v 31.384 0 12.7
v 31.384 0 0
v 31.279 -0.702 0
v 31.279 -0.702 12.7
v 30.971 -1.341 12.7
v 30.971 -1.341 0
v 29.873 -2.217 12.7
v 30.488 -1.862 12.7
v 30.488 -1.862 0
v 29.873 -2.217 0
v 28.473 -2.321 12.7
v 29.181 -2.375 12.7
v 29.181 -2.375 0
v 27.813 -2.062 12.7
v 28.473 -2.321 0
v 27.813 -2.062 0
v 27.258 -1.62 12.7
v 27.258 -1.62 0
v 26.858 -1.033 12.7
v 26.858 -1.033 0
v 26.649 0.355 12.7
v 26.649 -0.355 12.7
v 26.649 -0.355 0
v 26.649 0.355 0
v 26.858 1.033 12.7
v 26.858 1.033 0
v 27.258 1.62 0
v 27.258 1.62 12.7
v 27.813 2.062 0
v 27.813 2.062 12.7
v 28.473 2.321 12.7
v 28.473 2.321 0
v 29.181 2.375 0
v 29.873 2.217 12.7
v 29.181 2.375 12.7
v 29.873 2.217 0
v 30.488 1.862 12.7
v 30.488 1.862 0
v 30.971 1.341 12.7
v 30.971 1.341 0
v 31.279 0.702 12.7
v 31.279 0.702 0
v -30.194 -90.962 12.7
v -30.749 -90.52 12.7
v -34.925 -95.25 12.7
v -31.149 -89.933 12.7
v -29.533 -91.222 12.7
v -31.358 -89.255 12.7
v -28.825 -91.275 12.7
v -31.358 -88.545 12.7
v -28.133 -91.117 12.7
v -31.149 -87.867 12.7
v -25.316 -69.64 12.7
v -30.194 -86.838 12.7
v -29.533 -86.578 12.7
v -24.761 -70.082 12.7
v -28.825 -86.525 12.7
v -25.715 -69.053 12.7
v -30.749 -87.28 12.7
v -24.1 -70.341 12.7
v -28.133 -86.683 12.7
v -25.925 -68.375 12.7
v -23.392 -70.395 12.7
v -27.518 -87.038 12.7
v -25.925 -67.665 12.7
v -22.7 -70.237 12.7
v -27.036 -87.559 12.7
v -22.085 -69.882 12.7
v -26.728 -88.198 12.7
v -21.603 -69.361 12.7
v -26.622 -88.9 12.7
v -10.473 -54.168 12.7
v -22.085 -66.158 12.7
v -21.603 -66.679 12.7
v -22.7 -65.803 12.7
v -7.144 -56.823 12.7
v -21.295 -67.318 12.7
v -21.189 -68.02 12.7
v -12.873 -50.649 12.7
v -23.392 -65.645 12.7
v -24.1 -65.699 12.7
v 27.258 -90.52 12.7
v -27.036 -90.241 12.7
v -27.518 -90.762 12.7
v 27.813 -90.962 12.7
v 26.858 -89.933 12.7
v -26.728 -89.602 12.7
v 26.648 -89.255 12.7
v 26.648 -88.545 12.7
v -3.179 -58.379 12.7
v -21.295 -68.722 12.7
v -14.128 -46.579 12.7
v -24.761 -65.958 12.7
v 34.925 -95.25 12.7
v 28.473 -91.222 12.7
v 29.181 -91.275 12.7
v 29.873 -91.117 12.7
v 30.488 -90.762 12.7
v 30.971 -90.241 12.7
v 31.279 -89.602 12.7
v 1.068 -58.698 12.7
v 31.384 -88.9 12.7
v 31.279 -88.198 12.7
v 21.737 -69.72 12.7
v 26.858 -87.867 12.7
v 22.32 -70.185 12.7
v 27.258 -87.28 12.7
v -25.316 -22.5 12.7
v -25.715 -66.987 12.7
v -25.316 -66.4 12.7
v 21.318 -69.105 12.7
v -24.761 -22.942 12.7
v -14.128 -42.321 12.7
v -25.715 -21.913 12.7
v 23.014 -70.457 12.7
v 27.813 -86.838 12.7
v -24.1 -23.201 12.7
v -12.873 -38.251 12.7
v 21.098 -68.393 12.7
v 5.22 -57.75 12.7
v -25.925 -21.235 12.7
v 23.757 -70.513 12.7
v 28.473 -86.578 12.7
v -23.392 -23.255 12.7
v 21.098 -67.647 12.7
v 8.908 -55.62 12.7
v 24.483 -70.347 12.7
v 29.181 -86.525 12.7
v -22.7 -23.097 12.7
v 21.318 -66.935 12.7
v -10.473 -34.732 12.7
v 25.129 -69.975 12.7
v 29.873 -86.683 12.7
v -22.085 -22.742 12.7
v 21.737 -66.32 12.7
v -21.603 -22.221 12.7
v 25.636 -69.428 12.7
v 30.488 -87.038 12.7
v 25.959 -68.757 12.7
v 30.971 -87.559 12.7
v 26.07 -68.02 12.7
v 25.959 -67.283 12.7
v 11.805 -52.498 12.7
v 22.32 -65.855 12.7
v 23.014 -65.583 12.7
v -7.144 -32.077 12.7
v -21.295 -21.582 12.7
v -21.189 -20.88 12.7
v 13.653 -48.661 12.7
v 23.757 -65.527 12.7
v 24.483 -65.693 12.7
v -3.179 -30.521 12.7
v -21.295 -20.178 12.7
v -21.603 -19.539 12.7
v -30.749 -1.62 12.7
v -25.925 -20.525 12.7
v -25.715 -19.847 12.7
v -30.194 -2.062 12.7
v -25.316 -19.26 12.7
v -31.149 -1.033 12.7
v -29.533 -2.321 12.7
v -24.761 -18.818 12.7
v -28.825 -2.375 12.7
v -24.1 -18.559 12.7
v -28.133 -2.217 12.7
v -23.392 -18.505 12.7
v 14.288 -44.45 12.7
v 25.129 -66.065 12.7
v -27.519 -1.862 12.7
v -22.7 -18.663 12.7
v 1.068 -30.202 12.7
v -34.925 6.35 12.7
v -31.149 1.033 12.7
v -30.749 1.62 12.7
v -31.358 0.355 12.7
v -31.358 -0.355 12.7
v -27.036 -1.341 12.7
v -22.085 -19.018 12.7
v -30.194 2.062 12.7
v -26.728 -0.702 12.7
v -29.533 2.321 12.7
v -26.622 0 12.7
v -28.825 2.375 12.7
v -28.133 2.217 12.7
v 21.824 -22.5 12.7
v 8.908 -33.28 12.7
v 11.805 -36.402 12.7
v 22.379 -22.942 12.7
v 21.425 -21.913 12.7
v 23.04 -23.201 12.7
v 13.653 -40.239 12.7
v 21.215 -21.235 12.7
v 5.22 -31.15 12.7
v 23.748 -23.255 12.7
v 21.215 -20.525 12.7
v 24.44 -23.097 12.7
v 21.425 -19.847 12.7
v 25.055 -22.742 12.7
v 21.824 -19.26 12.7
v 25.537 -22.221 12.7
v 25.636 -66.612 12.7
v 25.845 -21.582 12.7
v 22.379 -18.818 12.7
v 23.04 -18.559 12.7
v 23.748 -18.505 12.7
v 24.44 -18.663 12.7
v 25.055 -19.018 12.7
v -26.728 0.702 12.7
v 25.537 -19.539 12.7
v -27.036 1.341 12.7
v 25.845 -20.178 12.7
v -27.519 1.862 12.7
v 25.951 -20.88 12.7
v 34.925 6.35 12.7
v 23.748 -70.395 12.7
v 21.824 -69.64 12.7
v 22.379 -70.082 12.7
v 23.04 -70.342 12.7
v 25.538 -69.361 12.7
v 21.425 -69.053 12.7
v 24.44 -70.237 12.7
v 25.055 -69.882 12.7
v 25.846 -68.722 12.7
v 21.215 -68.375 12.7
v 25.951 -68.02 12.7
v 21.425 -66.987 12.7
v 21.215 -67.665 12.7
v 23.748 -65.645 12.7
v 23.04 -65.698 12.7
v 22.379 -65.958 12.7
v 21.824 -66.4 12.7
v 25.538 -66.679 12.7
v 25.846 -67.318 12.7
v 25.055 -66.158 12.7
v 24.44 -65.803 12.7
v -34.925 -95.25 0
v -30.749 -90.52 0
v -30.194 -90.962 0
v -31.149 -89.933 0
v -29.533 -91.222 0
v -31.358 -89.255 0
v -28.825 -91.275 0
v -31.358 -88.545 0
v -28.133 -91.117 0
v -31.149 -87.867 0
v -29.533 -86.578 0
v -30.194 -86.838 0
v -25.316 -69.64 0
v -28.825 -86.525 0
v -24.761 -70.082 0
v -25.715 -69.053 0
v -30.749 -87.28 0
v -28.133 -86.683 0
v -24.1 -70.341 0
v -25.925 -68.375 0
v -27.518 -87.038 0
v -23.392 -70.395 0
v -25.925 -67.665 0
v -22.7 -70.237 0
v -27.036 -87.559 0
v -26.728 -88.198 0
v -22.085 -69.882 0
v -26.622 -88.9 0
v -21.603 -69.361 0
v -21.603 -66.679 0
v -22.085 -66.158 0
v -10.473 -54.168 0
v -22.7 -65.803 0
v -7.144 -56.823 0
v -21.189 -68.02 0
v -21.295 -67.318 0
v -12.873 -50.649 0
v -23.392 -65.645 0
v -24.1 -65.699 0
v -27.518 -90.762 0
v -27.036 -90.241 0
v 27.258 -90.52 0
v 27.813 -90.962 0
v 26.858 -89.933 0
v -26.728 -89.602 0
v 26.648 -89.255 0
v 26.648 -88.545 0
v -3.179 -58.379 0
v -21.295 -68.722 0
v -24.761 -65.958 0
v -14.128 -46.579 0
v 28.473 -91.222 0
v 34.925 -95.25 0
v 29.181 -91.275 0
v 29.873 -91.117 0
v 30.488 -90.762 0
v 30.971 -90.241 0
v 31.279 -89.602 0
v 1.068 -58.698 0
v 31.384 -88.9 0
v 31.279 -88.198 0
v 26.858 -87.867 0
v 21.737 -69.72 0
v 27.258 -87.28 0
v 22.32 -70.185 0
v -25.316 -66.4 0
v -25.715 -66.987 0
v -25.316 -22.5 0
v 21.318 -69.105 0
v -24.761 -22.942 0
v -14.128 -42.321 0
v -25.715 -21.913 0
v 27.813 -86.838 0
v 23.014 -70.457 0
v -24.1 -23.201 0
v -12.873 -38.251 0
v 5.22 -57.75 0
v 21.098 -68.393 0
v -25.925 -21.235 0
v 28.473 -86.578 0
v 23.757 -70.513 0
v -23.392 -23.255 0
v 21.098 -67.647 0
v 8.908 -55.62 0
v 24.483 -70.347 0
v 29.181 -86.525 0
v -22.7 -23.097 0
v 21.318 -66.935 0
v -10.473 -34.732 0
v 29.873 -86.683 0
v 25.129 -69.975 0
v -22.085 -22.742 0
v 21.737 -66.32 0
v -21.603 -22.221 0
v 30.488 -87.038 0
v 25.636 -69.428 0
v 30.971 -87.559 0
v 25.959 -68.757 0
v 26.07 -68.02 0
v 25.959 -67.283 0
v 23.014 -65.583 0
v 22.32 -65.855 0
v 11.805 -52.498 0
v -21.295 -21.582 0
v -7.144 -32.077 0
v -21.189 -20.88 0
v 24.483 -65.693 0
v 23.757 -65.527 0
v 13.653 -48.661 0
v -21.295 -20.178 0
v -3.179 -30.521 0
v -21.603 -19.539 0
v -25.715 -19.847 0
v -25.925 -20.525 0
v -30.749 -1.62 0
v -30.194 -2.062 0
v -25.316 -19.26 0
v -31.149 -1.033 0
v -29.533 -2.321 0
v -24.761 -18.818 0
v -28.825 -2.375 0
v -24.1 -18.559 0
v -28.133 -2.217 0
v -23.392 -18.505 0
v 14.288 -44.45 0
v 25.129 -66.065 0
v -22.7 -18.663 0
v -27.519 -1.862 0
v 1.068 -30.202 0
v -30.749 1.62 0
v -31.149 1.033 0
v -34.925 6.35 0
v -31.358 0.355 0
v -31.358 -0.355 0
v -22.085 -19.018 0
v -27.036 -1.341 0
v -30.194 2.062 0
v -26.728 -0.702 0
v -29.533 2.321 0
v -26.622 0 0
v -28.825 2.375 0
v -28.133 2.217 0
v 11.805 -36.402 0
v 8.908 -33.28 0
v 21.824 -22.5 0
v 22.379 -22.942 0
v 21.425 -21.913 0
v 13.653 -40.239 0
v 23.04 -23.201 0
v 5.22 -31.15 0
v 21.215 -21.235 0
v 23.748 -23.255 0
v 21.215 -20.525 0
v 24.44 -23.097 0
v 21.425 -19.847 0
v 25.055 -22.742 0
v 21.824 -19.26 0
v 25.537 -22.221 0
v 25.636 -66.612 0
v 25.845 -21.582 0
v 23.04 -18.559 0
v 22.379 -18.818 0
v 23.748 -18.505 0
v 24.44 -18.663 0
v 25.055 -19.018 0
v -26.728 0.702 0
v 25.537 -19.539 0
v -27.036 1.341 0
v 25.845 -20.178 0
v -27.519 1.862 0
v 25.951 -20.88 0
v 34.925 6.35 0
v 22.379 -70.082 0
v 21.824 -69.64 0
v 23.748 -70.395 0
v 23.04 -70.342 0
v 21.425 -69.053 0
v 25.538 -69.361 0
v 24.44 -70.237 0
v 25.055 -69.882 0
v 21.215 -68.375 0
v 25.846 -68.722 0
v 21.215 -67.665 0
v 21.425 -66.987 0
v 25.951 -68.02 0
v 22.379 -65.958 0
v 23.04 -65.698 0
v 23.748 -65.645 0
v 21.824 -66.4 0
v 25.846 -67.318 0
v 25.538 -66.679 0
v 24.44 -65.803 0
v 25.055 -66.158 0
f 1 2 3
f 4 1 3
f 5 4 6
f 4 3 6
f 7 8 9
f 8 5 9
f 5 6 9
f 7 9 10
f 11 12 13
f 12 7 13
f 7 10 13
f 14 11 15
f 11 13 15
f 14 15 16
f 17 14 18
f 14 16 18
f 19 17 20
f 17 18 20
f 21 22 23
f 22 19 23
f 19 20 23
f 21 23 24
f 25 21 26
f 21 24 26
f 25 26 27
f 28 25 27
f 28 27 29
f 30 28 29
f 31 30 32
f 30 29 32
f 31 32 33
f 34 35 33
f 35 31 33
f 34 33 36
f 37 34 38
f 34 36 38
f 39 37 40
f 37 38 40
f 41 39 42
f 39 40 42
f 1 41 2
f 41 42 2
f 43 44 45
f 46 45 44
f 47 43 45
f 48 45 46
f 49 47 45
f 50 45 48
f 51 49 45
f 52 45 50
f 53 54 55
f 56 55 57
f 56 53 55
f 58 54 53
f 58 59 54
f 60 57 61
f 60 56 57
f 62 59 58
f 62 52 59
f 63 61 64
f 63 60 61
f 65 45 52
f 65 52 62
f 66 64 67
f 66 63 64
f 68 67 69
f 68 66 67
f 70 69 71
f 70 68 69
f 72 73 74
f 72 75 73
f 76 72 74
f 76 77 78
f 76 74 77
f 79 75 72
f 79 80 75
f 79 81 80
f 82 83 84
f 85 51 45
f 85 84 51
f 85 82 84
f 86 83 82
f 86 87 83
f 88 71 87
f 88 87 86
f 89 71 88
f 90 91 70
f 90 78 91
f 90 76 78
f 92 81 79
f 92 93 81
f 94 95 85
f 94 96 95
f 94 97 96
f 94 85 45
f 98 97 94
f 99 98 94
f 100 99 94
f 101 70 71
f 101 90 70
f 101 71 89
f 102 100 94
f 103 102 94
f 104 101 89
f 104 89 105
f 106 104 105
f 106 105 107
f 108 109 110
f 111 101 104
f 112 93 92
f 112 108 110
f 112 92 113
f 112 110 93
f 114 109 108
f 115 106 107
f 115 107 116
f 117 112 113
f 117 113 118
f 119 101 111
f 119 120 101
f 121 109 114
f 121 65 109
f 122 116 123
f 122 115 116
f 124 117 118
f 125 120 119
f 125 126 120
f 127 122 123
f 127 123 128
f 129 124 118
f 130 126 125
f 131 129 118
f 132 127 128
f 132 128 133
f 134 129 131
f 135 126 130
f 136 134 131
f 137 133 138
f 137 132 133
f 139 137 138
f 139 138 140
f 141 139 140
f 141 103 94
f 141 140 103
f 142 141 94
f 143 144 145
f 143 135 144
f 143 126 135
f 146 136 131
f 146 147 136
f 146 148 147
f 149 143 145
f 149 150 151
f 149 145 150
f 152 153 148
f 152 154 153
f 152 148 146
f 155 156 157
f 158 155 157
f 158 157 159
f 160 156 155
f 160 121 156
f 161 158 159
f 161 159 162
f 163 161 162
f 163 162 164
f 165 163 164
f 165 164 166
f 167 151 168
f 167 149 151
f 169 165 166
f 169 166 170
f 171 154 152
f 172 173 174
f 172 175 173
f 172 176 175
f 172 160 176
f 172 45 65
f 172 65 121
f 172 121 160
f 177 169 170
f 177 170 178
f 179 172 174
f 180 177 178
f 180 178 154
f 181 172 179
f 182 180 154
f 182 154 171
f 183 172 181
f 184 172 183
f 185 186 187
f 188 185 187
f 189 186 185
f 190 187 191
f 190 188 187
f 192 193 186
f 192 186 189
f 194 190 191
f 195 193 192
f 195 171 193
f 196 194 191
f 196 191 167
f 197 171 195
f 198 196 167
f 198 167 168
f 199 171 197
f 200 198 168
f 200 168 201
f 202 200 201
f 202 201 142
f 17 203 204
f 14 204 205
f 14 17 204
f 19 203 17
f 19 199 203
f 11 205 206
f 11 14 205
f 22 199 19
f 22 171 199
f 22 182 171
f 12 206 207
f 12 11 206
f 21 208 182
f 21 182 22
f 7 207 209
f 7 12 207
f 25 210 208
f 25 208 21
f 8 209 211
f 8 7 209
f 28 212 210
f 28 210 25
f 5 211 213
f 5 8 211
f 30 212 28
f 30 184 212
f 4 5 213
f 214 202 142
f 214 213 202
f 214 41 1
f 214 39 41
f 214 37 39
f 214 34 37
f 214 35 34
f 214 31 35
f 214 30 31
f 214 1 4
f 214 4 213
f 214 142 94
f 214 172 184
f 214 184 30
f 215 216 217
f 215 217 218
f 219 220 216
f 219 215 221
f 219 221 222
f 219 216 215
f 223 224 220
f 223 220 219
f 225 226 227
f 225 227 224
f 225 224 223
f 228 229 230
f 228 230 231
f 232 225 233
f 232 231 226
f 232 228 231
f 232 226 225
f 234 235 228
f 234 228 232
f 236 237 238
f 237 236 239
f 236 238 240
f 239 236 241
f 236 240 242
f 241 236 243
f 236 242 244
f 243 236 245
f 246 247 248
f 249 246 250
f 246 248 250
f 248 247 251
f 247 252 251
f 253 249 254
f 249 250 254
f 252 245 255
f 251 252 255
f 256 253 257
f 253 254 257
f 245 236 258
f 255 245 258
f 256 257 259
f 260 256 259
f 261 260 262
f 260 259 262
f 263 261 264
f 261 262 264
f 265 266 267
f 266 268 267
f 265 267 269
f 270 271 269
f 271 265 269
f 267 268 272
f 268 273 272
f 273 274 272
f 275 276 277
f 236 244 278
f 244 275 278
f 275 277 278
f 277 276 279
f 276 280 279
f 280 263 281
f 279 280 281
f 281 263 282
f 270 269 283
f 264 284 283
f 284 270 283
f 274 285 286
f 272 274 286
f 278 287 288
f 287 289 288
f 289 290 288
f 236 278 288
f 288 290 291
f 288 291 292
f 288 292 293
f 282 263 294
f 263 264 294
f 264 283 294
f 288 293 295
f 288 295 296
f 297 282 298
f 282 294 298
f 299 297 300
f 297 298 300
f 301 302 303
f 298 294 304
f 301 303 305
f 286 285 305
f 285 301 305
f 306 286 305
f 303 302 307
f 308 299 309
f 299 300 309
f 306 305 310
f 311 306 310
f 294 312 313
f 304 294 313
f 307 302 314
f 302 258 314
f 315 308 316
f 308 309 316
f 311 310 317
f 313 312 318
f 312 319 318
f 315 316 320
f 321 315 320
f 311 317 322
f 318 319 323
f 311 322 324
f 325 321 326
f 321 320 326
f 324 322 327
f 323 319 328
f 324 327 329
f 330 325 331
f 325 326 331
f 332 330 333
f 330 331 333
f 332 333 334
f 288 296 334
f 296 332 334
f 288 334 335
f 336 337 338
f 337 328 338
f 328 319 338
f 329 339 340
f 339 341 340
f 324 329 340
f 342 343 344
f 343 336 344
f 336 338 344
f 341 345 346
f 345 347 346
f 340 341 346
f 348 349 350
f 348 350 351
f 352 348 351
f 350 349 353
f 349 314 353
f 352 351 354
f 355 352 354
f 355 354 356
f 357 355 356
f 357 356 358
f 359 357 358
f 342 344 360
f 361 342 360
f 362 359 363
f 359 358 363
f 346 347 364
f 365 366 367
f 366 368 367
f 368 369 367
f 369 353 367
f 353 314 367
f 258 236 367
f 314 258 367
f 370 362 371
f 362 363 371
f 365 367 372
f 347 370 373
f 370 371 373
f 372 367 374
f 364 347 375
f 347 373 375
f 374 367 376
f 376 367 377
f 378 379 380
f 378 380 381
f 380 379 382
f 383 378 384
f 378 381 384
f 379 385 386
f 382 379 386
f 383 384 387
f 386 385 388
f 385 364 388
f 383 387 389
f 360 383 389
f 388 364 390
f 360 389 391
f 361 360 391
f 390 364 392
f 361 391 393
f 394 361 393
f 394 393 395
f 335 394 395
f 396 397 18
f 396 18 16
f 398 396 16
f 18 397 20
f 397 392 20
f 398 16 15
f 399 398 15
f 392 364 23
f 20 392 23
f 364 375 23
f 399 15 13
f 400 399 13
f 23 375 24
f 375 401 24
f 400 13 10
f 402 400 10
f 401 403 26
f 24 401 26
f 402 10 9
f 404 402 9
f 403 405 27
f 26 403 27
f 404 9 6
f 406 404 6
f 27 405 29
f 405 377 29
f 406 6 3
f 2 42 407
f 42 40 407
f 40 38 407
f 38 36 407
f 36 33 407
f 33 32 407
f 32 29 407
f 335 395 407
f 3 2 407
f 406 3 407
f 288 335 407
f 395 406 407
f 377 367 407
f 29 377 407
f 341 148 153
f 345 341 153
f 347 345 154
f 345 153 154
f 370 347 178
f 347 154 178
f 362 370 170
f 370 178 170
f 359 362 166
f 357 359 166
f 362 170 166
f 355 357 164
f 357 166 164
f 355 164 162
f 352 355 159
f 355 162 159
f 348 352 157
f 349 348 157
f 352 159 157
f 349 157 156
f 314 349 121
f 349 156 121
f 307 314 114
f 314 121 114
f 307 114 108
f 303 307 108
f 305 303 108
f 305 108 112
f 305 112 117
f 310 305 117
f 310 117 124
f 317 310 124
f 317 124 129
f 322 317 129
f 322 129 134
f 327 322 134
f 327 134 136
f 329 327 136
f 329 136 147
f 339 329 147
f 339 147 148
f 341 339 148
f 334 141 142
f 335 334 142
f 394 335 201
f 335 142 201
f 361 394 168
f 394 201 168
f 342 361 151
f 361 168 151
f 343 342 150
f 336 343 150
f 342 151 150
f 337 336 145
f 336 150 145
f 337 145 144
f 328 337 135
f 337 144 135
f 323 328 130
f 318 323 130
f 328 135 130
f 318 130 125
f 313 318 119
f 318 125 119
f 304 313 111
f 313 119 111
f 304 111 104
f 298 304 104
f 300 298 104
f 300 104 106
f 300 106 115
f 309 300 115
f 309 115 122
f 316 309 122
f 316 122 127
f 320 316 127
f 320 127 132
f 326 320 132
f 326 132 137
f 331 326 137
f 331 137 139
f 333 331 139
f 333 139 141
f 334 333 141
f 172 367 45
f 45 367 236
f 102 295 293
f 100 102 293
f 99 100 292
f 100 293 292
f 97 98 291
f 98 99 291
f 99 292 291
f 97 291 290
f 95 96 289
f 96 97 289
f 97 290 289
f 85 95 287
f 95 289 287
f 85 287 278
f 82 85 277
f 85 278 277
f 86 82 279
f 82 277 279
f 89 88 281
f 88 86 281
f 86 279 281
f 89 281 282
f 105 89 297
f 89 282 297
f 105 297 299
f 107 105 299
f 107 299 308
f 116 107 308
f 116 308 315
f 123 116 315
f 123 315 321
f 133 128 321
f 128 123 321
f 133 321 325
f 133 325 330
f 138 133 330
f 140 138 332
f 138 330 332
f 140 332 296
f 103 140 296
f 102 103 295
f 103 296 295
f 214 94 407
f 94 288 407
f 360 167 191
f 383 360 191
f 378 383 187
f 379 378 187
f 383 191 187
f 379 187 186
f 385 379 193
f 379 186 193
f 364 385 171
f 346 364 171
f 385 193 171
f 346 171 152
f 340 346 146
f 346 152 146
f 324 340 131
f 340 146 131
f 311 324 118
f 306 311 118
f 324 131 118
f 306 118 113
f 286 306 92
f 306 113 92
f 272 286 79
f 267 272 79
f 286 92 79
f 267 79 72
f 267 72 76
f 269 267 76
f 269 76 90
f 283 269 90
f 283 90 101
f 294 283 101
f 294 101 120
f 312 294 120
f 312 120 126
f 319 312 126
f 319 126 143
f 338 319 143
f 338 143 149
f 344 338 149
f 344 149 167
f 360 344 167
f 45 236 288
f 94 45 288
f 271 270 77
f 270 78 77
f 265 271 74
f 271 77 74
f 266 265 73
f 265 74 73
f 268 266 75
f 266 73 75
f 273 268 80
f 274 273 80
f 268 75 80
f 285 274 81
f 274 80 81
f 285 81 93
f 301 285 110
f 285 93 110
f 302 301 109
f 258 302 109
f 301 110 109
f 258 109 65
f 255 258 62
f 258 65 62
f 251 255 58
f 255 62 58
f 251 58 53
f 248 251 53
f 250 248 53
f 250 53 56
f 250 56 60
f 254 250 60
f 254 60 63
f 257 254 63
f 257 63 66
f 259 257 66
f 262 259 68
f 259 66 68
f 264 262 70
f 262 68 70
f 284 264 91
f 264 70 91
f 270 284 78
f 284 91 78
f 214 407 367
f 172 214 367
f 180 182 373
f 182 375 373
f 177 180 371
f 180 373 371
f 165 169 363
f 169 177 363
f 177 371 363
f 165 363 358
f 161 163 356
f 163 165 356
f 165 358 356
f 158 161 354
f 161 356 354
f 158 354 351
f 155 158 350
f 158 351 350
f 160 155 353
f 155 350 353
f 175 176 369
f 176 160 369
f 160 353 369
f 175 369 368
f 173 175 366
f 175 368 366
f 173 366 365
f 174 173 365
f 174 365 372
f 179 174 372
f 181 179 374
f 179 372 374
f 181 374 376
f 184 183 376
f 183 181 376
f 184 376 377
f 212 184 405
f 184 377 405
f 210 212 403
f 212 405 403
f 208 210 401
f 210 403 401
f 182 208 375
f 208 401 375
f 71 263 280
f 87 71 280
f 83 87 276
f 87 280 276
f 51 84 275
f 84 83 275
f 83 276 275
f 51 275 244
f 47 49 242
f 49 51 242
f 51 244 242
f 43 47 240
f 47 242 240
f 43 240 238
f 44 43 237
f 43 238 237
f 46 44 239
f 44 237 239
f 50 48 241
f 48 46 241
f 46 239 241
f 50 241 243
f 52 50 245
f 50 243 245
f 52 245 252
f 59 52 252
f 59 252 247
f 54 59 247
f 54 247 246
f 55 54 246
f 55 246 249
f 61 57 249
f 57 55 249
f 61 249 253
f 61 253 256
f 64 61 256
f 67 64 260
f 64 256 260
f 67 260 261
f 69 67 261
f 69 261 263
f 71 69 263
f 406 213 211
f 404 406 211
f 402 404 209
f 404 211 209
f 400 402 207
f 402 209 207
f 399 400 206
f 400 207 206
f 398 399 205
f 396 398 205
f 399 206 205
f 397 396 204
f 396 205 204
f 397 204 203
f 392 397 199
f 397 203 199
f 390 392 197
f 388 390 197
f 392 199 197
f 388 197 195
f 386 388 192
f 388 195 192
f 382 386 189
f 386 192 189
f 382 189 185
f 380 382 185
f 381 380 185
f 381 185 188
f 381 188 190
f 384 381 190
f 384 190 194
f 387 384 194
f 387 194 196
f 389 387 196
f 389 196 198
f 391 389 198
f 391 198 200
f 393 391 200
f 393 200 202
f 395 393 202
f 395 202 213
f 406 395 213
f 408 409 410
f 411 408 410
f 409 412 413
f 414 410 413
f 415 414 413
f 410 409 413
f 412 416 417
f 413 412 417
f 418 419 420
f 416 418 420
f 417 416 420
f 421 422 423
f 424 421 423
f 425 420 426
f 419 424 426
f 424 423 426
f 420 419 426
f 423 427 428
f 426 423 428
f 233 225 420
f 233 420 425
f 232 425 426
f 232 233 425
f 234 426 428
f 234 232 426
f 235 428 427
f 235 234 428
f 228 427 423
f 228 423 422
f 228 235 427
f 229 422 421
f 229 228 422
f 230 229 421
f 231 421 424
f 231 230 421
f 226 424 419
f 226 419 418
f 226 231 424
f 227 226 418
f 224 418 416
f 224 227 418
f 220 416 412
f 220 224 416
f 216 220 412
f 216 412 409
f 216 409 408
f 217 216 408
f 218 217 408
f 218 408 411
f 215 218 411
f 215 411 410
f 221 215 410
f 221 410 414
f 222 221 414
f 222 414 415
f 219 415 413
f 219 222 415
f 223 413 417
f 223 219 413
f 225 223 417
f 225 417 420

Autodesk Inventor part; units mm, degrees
ref_plane "YZ Plane" through (0, 0, 0) normal (1, 0, 0) x (0, 1, 0)
ref_plane "XZ Plane" through (0, 0, 0) normal (0, 1, 0) x (-1, 0, 0)
ref_plane "XY Plane" through (0, 0, 0) normal (0, 0, 1) x (1, 0, 0)
sketch "Sketch1" plane through (0, 0, 0) normal (0, 0, 1) x (1, 0, 0)
  line L0 (34.925, 6.35) -> (-34.925, 6.35) projected
  line L1 (-34.925, 6.35) -> (-34.925, -6.35) projected
  line L2 (-34.925, -6.35) -> (34.925, -6.35) projected
  line L3 (34.925, -6.35) -> (34.925, 6.35) projected
  circle A0 centre (-29.0032, 0) radius 2.3812 projected
  circle A1 centre (29.0032, 0) radius 2.3812 projected
  line L4 (34.925, -82.55) -> (-34.925, -82.55) projected
  line L5 (-34.925, -82.55) -> (-34.925, -95.25) projected
  line L6 (-34.925, -95.25) -> (34.925, -95.25) projected
  line L7 (34.925, -95.25) -> (34.925, -82.55) projected
  circle A2 centre (-29.0032, -88.9) radius 2.3813 projected
  circle A3 centre (29.0032, -88.9) radius 2.3813 projected
  line L8 (34.925, -6.35) -> (34.925, -82.55)
  line L9 (-34.925, -82.55) -> (-34.925, -6.35)
  point P0 (0, 0)
extrude "Extrusion1" add sketch "Sketch1" along normal blind 12.7
sketch "Sketch2" plane through (0, 0, 12.7) normal (0, 0, 1) x (1, 0, 0)
  circle A0 centre (0, -44.45) radius 14.2875 projected
  point P0 (0, 0)
extrude "Extrusion2" cut sketch "Sketch2" against normal blind 12.7
sketch "Sketch3" plane through (0, 0, 12.7) normal (0, 0, 1) x (1, 0, 0)
  circle A0 centre (23.57, -20.88) radius 2.5 projected
  circle A1 centre (23.57, -68.02) radius 2.5 projected
  circle A2 centre (-23.57, -68.02) radius 2.5 projected
  circle A3 centre (-23.57, -20.88) radius 2.5 projected
  circle A4 centre (23.57, -20.88) radius 2.3812
  circle A5 centre (23.57, -68.02) radius 2.3813
  circle A6 centre (-23.57, -68.02) radius 2.3812
  circle A7 centre (-23.57, -20.88) radius 2.3812
  point P0 (0, 0)
  dimension "d4" = 4.7625
  dimension "d5" = 4.7625
  dimension "d6" = 4.7625
  dimension "d7" = 4.7625
extrude "Extrusion3" cut sketch "Sketch3" against normal blind 25.4 contours A1 | A4 | A6 | A7
properties part number "Stepper Mount Y"
